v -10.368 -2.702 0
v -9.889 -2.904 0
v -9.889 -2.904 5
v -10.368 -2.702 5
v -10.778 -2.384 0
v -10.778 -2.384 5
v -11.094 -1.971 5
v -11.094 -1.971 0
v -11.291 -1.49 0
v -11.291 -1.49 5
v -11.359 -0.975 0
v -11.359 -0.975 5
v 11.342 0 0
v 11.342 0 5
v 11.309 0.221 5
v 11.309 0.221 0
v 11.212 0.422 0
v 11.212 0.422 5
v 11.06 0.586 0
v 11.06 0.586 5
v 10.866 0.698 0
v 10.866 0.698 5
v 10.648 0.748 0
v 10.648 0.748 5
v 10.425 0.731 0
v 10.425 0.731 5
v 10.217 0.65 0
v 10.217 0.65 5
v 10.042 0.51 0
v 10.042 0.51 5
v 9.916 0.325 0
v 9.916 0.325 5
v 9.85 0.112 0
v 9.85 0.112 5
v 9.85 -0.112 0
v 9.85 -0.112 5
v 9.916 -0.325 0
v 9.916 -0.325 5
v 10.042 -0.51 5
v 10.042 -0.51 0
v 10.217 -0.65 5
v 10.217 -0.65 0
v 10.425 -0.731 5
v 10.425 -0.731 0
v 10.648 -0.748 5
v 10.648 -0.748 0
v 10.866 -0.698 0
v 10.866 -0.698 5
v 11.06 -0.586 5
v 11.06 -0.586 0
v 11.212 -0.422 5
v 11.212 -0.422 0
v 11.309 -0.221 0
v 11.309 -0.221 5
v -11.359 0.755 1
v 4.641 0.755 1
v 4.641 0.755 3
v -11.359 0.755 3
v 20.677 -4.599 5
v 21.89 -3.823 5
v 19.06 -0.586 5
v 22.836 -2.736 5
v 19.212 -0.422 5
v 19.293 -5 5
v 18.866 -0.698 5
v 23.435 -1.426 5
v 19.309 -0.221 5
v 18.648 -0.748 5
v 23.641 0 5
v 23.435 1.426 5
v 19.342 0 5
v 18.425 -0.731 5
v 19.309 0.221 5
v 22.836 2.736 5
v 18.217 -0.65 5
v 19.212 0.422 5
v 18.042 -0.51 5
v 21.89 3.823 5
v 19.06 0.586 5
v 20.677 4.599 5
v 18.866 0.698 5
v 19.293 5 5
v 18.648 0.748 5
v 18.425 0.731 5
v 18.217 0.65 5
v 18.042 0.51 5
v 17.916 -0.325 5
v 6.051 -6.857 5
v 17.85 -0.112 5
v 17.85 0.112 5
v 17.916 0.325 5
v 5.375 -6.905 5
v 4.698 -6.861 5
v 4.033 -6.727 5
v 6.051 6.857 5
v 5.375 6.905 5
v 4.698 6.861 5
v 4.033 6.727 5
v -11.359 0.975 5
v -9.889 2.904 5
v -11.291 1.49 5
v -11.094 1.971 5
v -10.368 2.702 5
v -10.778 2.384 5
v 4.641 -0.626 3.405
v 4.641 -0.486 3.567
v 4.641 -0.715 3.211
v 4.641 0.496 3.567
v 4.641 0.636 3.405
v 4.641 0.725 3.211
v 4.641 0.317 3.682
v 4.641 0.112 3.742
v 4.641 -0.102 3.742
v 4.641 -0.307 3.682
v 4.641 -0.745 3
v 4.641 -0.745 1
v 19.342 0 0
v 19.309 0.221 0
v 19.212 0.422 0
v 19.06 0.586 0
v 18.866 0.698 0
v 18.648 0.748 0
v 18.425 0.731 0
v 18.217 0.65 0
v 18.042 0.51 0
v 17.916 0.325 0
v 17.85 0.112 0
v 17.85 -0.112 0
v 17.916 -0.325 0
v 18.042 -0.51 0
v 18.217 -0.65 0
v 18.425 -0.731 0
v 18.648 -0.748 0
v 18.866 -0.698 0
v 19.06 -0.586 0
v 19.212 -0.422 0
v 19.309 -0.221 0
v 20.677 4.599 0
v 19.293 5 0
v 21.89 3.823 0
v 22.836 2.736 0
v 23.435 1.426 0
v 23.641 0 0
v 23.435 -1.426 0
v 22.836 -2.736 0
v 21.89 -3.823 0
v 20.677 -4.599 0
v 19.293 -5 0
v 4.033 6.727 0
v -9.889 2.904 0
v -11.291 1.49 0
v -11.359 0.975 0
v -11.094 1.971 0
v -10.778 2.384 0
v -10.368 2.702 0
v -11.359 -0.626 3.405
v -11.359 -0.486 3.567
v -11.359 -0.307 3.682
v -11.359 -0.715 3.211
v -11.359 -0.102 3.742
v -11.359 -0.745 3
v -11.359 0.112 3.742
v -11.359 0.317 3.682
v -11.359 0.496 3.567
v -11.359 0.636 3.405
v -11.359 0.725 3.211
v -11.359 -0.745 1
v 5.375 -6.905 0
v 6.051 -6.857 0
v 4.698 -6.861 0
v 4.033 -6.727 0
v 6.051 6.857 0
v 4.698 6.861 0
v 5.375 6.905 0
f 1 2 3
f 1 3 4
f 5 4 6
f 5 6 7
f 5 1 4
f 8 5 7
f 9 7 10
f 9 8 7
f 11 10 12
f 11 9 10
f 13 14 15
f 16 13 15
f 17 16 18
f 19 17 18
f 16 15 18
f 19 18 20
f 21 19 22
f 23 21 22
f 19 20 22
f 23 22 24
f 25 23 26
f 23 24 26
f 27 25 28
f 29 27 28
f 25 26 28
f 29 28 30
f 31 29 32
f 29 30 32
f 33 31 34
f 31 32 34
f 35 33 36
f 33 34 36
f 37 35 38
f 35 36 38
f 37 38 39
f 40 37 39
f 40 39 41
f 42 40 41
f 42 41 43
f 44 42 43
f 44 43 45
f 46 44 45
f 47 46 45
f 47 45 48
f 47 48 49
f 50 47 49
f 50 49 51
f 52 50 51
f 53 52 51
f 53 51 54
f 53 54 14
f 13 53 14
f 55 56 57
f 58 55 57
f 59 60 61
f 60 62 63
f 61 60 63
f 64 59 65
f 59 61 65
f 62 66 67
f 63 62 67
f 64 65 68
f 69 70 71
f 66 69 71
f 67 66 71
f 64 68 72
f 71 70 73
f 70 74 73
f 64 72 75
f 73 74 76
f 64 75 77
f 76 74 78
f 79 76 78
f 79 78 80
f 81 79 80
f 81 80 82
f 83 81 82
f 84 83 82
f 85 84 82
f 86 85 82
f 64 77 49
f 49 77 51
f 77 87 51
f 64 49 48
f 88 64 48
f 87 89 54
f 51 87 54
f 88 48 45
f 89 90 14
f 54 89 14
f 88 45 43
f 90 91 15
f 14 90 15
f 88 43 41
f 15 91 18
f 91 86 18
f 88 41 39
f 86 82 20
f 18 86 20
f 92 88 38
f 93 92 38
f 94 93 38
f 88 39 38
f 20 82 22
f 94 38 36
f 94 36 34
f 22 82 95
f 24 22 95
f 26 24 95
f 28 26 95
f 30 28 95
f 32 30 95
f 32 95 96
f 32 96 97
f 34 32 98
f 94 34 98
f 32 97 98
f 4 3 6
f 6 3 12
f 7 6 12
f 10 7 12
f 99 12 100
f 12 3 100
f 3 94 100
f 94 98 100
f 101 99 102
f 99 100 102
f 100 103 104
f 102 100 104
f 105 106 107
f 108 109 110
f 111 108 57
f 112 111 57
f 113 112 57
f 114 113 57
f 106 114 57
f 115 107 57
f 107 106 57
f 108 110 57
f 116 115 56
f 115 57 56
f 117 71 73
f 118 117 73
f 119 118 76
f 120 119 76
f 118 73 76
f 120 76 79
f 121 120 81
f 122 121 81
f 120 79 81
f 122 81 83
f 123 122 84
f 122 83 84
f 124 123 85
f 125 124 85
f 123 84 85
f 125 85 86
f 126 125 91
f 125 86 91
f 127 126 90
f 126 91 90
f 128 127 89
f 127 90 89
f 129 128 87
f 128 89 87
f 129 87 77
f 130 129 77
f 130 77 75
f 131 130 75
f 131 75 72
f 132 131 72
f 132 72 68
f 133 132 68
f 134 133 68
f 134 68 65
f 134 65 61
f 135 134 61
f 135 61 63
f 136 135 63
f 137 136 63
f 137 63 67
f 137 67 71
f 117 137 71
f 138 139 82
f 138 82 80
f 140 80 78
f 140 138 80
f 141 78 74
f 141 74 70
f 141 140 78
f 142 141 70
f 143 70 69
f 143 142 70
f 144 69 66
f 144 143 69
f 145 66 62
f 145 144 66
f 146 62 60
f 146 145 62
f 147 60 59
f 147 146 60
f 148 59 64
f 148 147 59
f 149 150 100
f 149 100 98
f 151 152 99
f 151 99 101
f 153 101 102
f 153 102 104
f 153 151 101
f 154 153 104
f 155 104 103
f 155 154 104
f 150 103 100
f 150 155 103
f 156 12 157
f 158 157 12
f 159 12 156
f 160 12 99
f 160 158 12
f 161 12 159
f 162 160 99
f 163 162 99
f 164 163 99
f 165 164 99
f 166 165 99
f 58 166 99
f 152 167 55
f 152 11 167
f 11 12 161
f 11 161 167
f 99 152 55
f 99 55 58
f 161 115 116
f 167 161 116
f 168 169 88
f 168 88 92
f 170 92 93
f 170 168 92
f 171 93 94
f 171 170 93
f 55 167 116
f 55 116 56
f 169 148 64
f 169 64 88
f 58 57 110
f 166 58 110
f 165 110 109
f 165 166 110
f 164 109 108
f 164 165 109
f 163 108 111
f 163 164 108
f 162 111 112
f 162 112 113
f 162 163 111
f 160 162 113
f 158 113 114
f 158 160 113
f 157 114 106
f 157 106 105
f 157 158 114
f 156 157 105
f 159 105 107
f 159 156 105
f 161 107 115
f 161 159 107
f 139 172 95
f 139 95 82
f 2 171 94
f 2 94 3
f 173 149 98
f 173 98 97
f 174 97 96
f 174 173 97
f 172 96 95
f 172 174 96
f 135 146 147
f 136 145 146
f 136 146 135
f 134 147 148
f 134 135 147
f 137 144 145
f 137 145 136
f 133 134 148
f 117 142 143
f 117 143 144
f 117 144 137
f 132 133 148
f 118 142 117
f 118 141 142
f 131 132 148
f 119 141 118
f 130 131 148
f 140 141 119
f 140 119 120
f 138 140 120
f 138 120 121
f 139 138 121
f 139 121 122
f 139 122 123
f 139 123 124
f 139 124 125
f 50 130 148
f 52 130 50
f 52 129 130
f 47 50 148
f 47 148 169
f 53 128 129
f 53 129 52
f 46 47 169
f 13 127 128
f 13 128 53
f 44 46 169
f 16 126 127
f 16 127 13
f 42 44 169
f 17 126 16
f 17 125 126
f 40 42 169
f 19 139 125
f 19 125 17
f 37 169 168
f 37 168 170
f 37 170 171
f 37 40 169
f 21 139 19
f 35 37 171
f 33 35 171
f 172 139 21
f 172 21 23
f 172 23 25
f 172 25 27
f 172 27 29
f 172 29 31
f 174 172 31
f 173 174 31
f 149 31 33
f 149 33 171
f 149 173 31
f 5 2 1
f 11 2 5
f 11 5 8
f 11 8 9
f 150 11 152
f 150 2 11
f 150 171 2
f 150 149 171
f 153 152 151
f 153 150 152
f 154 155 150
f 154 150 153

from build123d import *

# Parameters (mm, degrees)
BOSS_EXTRUDE1_DEPTH = 5
CUT_EXTRUDE2_DEPTH  = 16
SKETCH3_R           = 0.75
CUT_EXTRUDE3_DEPTH  = 8


with BuildPart() as part:
    # Sketch1 → Boss-Extrude1 (new body)
    with BuildSketch(Plane.XY):
        with BuildLine():
            Line((-11.358992197, -0.975163345), (-11.358992197, 0.975163345))
            ThreePointArc((-11.358992197, 0.975163345), (-10.949461796, 2.187766517), (-9.888585744, 2.903771827))
            Line((-9.888585744, 2.903771827), (4.032865761, 6.726585506))
            ThreePointArc((4.032865761, 6.726585506), (5.035336984, 6.894716557), (6.051095895, 6.856631946))
            Line((6.051095895, 6.856631946), (19.293138558, 5))
            ThreePointArc((19.293138558, 5), (23.641007803, 0), (19.293138558, -5))
            Line((19.293138558, -5), (6.051095895, -6.856631946))
            ThreePointArc((6.051095895, -6.856631946), (5.035336984, -6.894716557), (4.032865761, -6.726585506))
            Line((4.032865761, -6.726585506), (-9.888585744, -2.903771827))
            ThreePointArc((-9.888585744, -2.903771827), (-10.949461796, -2.187766517), (-11.358992197, -0.975163345))
        make_face()
    extrude(amount=BOSS_EXTRUDE1_DEPTH)

    # Sketch2 → Cut-Extrude2 (cut)
    with BuildSketch(Plane.ZY.offset(11.358992197)):
        with BuildLine():
            Line((1, -0.745034354), (1, 0.754965646))
            Line((1, 0.754965646), (3, 0.754965646))
            ThreePointArc((3, 0.754965646), (3.75, 0.004965646), (3, -0.745034354))
            Line((3, -0.745034354), (1, -0.745034354))
        make_face()
    extrude(amount=-CUT_EXTRUDE2_DEPTH, mode=Mode.SUBTRACT)

    # Sketch3 → Cut-Extrude3 (cut)
    with BuildSketch(Plane.XY.offset(5)):
        with Locations((18.592101719, 0)):
            Circle(SKETCH3_R)
        with Locations((10.592101719, 0)):
            Circle(SKETCH3_R)
    extrude(amount=-CUT_EXTRUDE3_DEPTH, mode=Mode.SUBTRACT)


solid = part.part
